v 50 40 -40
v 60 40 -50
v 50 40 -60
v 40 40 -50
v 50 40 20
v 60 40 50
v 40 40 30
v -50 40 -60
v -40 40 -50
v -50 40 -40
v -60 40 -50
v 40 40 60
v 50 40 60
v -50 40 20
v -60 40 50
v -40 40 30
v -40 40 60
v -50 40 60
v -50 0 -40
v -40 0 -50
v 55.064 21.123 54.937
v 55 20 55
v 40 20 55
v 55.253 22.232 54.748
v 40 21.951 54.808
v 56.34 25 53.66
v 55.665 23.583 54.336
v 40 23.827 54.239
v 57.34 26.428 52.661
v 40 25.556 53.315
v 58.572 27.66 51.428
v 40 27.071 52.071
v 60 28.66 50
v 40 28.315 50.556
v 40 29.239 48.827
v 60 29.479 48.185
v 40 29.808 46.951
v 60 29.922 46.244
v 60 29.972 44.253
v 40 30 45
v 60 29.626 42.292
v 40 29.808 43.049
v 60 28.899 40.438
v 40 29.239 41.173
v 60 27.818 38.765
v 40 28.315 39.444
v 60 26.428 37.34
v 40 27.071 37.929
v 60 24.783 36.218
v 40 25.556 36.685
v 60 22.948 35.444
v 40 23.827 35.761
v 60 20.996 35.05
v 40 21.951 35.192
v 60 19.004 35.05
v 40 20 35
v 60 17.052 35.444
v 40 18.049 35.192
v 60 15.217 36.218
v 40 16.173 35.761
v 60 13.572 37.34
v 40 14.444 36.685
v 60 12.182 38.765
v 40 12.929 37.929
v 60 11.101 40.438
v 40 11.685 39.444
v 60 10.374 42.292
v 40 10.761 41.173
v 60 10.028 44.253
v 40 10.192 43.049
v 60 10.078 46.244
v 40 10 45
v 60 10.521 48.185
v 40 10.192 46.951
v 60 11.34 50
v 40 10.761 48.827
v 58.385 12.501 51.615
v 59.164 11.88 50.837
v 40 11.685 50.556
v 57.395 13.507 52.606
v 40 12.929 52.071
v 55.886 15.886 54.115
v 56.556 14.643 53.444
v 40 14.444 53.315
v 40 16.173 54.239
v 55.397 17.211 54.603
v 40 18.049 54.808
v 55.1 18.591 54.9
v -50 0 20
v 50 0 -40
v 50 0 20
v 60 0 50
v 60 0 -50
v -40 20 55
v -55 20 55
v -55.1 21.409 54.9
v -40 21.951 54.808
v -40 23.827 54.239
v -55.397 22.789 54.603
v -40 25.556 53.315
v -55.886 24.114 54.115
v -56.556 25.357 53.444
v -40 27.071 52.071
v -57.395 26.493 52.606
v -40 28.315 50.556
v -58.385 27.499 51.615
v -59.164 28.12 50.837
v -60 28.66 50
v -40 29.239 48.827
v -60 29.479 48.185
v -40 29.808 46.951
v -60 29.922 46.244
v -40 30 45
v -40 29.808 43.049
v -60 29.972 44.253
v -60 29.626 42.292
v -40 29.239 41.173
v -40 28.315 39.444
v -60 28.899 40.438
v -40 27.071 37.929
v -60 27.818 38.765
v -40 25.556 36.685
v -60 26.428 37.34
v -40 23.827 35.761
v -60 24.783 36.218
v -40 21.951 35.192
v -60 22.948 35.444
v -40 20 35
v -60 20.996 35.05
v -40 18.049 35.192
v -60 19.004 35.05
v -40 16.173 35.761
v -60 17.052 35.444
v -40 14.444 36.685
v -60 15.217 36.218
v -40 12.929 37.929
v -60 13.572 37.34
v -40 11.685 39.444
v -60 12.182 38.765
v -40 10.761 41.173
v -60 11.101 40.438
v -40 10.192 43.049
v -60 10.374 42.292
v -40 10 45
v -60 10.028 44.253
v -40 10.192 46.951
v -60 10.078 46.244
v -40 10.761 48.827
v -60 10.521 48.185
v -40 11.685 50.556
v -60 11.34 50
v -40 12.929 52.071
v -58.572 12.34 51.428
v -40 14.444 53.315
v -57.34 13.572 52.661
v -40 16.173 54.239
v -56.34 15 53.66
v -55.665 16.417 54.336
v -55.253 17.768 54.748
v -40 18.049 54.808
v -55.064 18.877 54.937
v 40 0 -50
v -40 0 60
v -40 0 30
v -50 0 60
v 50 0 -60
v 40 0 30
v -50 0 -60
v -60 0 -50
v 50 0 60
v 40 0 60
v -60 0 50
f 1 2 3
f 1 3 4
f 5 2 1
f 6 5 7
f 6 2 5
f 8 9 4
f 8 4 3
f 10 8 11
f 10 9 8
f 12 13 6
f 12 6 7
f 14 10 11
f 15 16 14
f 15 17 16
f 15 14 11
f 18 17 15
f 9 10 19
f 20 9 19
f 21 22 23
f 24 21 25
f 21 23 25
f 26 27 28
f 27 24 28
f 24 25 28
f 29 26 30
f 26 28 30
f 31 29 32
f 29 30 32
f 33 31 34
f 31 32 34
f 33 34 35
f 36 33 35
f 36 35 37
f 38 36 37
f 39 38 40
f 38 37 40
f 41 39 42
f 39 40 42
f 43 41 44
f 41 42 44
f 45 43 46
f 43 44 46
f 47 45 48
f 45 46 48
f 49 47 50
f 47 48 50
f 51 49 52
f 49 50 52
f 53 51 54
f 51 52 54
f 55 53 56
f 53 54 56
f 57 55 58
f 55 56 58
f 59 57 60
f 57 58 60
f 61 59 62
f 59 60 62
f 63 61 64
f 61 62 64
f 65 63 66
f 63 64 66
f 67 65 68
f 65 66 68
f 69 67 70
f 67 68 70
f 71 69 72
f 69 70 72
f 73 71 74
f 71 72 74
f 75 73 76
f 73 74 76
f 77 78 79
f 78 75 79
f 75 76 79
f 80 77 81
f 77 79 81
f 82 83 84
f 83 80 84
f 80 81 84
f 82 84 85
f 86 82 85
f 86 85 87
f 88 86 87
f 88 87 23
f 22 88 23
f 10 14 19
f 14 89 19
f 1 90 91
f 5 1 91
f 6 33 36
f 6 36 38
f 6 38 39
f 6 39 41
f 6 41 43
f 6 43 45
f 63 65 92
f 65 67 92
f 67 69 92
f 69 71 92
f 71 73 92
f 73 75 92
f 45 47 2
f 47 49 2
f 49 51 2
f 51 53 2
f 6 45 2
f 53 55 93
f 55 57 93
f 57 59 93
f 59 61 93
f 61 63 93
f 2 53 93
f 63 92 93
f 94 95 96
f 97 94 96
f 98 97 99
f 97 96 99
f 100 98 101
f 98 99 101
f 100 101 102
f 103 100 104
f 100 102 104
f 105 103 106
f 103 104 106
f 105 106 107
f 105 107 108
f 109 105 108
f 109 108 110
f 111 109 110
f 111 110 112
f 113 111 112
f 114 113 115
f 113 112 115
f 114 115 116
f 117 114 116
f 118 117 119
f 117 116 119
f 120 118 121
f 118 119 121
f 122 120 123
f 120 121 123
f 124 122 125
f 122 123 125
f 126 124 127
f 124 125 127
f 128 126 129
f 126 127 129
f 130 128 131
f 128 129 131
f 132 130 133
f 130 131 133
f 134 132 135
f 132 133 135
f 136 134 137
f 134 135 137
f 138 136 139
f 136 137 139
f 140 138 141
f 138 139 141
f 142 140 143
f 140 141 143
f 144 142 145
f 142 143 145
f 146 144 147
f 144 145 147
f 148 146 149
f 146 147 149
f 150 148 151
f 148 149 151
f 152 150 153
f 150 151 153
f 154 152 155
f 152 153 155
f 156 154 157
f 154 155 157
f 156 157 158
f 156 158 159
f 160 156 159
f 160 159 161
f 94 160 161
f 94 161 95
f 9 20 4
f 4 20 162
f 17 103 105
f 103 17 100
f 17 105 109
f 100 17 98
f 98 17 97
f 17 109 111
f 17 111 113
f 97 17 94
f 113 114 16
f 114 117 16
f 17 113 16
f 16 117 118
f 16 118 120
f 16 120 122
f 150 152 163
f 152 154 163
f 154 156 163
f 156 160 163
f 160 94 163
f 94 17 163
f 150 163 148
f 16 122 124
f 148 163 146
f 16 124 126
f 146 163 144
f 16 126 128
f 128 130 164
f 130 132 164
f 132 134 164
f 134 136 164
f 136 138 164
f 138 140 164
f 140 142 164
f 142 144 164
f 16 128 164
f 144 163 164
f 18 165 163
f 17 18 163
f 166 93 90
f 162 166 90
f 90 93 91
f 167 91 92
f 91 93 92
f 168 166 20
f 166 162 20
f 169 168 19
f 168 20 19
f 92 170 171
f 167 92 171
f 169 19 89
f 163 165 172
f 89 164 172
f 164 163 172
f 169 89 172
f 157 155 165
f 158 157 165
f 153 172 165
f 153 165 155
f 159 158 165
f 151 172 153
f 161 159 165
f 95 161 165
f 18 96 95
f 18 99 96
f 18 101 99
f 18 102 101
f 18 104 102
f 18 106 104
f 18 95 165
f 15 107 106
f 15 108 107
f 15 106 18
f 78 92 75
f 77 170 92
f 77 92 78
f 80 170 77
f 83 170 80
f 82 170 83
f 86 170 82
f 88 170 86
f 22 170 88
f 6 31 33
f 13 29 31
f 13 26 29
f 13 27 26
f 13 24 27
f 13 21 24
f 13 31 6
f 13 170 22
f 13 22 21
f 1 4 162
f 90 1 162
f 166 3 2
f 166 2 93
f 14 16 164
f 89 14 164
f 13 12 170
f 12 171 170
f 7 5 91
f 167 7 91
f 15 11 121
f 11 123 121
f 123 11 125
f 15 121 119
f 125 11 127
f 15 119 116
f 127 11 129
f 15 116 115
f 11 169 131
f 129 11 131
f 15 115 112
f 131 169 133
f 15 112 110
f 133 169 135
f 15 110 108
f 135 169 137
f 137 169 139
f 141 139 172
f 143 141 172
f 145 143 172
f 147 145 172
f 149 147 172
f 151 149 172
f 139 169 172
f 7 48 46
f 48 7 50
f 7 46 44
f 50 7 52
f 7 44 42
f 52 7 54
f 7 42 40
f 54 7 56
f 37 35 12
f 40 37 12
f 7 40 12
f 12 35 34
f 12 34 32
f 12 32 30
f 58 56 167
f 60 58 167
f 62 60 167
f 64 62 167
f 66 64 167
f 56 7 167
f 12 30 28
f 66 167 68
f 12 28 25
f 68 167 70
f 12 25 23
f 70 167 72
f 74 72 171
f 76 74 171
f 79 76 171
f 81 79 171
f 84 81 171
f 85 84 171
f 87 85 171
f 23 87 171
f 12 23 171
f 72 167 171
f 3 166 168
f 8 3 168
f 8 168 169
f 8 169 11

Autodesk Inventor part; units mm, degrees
ref_plane "YZ Plane" through (0, 0, 0) normal (1, 0, 0) x (0, 1, 0)
ref_plane "XZ Plane" through (0, 0, 0) normal (0, 1, 0) x (-1, 0, 0)
ref_plane "XY Plane" through (0, 0, 0) normal (0, 0, 1) x (1, 0, 0)
sketch "Sketch1" plane through (0, 0, 0) normal (0, 1, 0) x (-1, 0, 0)
  line L0 (-60, -60) -> (60, -60)
  line L1 (60, -60) -> (60, 60)
  line L2 (60, 60) -> (-60, 60)
  line L3 (-60, 60) -> (-60, -60)
  line L4 (-60, -60) -> (60, 60) construction
  line L5 (60, -60) -> (-60, 60) construction
  line L6 (40, 60) -> (40, 30)
  line L7 (40, 30) -> (50, 30)
  line L8 (50, 30) -> (50, -50)
  line L9 (50, -50) -> (-50, -50)
  line L10 (-50, -50) -> (-50, 30)
  line L11 (-50, 30) -> (-40, 30)
  line L12 (-40, 30) -> (-40, 60)
  point P0 (0, 0)
  dimension "d0" = 120
  dimension "d1" = 120
  dimension "d2" = 20
  dimension "d3" = 20
  dimension "d4" = 10
  dimension "d5" = 10
  dimension "d6" = 10
  dimension "d7" = 30
extrude "Extrusion1" add sketch "Sketch1" along normal blind 40 contours L3 L2 L12 L11 L10 L9 L8 L7 L6 L1 L0
chamfer "Chamfer1" distance 10 angle 45 8 edges at (60, 20, 60) (60, 20, -60) (-50, 20, -50) (-60, 20, -60) (50, 20, -50) (-60, 20, 60) (50, 20, 30) (-50, 20, 30)
sketch "Sketch2" plane through (-60, 0, -50) normal (-1, 0, 0) x (0, 0, 1)
  circle A0 centre (95, 20) radius 10
  line L0 (110, 0) -> (110, 40) projected
  line L1 (0, 40) -> (100, 40) projected
  point P0 (50, 0)
  dimension "d13" = 15
  dimension "d14" = 20
  dimension "d15" = 20
extrude "Extrusion2" cut sketch "Sketch2" against normal through all
equation "\"d5\" = d4"
properties part number "frame"
